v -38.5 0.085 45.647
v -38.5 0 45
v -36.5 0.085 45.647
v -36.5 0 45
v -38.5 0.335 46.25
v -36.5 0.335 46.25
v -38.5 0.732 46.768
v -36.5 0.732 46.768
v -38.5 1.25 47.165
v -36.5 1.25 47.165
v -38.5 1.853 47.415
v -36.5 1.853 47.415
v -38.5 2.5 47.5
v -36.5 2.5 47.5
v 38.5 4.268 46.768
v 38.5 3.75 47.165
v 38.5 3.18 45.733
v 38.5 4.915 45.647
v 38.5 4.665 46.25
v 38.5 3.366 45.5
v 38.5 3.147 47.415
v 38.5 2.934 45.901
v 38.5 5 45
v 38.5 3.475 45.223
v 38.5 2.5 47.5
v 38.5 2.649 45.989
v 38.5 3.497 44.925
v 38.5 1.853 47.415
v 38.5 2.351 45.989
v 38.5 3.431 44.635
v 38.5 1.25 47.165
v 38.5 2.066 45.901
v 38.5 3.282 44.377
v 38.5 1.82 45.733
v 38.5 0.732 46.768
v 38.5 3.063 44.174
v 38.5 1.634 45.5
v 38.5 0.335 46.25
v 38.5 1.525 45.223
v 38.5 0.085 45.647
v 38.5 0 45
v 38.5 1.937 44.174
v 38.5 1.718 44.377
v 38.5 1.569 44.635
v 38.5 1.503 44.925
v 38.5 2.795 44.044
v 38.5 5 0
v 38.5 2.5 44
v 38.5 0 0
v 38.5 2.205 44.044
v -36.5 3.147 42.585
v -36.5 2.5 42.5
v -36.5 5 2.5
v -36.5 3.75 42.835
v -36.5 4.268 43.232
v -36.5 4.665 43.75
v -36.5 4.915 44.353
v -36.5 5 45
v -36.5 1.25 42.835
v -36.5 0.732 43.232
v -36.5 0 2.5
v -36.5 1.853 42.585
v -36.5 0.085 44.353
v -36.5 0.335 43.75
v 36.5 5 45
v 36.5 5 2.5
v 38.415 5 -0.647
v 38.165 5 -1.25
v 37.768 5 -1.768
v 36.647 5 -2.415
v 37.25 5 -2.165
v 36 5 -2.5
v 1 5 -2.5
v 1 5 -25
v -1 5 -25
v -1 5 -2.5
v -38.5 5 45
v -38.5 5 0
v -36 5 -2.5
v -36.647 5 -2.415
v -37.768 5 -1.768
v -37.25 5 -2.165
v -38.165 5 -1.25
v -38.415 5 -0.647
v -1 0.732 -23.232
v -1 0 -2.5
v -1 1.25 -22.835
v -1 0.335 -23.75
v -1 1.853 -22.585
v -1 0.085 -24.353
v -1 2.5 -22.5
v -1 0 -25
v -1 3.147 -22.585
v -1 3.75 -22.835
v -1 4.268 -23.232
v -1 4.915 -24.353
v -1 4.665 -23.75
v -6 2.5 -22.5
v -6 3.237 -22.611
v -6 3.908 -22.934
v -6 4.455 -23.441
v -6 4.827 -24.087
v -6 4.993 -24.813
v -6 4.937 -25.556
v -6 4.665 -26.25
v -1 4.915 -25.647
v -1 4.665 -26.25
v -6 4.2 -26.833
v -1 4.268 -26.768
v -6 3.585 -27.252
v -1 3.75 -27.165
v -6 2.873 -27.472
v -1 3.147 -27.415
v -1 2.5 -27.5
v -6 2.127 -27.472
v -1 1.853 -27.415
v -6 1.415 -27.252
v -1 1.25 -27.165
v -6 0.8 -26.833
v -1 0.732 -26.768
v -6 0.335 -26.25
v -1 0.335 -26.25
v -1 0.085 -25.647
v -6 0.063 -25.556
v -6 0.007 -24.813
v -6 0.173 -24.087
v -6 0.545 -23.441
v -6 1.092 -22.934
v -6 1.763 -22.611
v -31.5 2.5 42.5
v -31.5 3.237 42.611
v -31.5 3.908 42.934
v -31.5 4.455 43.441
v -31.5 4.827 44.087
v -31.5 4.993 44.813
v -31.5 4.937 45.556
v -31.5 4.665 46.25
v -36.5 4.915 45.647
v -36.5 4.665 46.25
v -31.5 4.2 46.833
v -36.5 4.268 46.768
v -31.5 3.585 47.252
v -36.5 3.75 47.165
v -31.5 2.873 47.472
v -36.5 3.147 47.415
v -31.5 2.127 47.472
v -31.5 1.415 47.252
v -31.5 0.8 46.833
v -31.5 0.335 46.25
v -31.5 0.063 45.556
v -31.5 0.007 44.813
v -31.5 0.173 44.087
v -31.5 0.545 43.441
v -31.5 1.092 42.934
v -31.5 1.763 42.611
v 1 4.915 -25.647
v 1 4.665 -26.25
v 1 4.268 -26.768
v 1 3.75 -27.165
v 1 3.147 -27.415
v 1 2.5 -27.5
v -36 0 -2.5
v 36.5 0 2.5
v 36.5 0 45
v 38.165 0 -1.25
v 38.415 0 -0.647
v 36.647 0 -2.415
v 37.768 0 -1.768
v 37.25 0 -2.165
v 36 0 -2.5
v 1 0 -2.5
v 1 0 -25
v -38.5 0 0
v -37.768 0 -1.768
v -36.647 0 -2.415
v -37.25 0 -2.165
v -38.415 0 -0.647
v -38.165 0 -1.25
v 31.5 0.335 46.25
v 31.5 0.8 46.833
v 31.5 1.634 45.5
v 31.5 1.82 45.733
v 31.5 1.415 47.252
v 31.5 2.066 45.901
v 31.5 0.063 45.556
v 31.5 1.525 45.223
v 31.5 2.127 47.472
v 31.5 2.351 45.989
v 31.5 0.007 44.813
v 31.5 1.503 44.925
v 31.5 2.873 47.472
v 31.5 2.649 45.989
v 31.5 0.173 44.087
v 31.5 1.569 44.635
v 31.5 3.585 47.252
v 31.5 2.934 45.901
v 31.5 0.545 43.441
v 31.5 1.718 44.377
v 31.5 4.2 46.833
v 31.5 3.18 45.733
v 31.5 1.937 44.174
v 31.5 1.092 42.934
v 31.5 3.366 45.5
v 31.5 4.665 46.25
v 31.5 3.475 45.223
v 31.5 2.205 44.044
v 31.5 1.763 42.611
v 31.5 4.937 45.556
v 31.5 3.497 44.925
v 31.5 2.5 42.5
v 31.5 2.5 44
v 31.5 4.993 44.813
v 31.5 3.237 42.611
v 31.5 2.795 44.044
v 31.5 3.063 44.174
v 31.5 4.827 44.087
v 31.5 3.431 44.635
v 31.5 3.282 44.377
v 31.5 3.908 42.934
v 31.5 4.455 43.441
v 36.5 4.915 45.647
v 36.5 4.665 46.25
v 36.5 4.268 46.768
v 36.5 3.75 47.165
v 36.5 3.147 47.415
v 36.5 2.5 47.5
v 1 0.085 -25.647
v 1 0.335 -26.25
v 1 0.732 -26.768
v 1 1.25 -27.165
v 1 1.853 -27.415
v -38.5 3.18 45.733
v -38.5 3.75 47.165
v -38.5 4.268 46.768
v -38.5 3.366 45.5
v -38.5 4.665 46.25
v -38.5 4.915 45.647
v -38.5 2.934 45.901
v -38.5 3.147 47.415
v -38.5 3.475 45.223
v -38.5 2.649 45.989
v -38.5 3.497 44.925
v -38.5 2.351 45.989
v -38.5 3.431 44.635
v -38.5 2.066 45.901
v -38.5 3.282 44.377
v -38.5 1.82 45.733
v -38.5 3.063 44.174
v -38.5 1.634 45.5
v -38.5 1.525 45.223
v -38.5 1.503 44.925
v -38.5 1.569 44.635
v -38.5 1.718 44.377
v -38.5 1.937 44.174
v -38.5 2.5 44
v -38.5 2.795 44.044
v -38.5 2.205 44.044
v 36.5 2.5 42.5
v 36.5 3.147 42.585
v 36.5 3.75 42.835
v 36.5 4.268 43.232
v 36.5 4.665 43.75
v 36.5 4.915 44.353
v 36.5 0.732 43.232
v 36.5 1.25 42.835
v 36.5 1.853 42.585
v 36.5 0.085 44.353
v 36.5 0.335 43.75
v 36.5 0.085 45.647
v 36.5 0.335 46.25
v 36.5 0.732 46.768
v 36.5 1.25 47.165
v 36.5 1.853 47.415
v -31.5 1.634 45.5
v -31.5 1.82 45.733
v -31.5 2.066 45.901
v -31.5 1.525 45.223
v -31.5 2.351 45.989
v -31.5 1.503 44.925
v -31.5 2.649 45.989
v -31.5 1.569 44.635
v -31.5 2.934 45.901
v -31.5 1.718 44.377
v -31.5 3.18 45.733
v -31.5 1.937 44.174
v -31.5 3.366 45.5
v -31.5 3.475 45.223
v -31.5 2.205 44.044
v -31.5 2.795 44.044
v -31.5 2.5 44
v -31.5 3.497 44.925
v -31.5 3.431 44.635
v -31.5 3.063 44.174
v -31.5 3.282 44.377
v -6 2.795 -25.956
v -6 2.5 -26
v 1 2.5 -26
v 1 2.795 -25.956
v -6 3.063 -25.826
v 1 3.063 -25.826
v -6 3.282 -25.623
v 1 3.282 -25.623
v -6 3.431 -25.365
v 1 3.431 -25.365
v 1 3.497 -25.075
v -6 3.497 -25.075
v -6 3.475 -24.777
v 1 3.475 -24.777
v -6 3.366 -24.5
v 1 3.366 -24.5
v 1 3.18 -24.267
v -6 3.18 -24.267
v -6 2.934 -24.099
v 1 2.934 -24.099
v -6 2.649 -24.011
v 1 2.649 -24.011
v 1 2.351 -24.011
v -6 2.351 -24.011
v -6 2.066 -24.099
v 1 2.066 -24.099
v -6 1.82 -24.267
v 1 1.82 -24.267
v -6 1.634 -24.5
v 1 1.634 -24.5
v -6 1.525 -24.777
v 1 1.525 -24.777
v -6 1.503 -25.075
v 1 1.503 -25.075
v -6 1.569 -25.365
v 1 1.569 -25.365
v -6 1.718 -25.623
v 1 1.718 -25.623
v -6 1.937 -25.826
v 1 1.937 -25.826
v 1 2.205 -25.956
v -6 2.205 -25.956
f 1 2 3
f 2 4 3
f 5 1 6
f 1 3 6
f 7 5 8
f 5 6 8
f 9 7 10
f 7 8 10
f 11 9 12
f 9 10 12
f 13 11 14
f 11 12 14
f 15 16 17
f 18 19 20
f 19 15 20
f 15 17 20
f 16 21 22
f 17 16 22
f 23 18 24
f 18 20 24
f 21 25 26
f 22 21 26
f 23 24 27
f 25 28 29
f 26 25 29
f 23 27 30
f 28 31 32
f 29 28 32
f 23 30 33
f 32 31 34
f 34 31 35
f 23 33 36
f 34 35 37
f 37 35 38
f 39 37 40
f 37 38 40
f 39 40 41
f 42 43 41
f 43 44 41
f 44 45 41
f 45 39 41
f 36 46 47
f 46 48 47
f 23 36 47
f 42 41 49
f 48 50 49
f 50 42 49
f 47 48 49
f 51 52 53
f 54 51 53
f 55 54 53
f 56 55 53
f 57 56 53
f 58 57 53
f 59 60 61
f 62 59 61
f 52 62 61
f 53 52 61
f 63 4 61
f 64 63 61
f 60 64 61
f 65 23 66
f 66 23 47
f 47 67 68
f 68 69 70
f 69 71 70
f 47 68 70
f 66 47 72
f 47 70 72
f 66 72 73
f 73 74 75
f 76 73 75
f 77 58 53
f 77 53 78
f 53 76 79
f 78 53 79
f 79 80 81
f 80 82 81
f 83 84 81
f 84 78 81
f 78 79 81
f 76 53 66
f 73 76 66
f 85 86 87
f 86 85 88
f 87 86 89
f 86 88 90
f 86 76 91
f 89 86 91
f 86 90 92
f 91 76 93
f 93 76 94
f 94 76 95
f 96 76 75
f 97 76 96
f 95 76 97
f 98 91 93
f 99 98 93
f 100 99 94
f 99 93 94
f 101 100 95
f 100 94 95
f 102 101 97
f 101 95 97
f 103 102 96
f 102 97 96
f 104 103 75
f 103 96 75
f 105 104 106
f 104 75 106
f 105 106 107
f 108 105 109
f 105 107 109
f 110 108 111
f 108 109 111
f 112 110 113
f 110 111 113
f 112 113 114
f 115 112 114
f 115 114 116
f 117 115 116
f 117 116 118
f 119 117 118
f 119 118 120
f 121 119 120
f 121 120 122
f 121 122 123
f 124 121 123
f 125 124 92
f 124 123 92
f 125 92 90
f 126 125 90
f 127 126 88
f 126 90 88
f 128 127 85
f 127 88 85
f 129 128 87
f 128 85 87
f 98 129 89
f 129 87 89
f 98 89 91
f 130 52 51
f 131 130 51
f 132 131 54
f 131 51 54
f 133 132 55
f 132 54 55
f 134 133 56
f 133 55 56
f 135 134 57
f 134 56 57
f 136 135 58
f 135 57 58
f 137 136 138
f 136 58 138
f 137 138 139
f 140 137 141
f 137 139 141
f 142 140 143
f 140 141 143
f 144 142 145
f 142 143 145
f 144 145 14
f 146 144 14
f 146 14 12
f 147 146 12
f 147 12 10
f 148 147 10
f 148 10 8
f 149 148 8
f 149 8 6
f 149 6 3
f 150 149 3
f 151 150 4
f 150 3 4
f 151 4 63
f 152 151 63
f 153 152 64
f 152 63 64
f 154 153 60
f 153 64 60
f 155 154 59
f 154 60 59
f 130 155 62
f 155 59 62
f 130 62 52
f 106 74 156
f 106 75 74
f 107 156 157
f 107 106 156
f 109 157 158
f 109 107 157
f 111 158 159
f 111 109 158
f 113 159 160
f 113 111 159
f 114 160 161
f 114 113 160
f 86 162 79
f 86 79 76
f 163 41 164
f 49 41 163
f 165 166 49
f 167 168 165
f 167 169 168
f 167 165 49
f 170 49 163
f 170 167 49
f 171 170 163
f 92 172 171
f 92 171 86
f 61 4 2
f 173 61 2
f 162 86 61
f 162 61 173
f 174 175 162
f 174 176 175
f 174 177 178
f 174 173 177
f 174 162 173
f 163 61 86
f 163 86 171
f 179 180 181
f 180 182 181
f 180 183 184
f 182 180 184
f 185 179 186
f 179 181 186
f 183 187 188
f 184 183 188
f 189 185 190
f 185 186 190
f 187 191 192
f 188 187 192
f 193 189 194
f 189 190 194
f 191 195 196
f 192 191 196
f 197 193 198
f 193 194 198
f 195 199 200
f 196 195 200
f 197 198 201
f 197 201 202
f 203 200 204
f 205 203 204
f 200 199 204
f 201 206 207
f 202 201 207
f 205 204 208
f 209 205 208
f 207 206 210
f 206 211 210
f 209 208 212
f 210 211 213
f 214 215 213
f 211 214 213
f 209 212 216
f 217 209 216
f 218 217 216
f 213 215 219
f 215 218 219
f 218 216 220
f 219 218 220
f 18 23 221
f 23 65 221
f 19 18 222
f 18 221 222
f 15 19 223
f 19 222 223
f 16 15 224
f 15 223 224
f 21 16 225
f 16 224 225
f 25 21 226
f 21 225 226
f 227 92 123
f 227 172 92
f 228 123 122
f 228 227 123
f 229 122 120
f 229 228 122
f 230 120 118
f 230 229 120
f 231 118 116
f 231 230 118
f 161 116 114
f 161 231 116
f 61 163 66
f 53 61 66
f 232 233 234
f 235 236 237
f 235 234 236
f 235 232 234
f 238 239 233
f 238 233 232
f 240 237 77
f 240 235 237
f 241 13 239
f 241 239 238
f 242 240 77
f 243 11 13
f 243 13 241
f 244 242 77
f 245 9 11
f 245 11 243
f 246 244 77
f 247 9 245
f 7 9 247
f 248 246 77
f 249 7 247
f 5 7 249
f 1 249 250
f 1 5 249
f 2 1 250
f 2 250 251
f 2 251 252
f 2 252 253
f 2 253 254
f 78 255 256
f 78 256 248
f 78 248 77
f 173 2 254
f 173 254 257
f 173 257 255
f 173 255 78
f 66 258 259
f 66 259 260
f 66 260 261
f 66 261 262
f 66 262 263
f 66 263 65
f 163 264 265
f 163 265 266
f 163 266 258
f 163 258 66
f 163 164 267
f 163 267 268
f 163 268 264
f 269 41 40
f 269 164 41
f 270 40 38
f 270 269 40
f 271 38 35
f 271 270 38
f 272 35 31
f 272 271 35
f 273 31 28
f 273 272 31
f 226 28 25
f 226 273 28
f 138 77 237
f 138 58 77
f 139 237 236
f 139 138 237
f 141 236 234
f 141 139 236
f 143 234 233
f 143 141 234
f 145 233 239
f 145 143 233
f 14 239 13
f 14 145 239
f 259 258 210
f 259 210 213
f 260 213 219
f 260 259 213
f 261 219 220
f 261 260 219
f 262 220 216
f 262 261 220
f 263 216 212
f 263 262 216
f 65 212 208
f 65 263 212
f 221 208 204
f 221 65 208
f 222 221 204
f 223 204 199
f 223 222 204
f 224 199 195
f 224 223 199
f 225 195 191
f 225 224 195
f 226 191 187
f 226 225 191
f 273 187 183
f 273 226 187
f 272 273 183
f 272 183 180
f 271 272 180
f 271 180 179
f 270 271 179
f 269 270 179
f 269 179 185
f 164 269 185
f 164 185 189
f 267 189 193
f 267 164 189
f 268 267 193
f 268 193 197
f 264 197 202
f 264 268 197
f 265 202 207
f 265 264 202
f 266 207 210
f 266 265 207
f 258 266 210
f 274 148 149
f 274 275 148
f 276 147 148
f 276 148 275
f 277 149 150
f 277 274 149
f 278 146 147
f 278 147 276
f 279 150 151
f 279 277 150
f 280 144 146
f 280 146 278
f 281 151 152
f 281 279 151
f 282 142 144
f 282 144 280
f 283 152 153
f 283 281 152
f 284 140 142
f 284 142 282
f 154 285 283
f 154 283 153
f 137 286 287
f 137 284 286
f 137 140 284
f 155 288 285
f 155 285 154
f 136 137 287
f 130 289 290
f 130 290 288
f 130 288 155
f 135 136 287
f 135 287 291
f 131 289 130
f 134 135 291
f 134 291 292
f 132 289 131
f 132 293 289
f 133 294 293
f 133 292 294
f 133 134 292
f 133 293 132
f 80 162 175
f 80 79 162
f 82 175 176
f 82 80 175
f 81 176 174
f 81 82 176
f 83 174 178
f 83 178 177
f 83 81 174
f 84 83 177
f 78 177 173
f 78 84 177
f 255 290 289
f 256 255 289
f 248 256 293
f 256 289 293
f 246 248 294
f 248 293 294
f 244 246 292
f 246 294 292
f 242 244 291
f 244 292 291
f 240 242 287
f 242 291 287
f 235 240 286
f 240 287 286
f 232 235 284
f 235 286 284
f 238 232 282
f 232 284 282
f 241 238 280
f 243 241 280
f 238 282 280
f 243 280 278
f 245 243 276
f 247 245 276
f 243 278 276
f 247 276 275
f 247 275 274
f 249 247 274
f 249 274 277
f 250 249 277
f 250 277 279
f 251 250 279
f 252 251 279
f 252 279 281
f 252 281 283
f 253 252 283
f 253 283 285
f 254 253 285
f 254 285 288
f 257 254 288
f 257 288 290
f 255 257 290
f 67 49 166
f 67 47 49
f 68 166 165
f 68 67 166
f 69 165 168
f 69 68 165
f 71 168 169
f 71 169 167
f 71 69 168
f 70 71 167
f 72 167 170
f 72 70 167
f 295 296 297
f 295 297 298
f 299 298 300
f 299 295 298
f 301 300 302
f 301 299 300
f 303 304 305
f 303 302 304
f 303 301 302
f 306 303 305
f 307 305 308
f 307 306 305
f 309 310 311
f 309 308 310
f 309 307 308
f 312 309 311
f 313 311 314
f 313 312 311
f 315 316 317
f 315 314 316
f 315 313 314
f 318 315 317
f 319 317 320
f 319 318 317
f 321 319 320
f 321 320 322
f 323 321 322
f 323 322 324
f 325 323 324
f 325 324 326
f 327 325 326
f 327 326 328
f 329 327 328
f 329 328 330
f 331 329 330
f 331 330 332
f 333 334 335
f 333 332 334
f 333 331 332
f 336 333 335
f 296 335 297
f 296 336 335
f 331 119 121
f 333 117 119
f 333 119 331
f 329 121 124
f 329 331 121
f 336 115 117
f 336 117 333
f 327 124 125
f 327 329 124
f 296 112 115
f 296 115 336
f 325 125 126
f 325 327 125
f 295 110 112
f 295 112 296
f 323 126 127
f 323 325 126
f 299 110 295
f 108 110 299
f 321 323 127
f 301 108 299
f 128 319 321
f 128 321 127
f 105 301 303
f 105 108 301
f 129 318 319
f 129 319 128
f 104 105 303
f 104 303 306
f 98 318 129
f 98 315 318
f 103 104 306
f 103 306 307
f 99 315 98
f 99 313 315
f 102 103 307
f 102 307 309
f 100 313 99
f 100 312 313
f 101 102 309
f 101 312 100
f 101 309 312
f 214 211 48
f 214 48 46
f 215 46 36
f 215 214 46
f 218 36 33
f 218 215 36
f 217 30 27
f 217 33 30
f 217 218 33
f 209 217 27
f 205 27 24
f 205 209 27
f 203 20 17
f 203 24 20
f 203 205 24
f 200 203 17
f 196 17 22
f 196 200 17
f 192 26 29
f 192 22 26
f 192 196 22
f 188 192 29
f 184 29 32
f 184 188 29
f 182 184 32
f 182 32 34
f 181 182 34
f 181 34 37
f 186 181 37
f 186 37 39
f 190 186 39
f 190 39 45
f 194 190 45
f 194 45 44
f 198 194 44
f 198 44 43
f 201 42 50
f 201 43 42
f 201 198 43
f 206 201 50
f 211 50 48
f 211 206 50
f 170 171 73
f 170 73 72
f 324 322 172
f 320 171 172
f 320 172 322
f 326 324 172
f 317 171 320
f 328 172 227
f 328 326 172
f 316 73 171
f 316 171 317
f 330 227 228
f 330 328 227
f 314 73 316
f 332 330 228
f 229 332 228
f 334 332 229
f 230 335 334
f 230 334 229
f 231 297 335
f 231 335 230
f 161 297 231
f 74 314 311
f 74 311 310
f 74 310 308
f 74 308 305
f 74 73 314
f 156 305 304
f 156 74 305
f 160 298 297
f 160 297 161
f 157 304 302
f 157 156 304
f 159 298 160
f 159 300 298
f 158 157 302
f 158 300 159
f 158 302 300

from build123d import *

# Parameters (mm, degrees)
ESBO_O1_W                  = 77
ESBO_O1_H                  = 5
RESSALTO_EXTRUS_O1_DEPTH   = 5
ESBO_O2_W                  = 2
ESBO_O2_H                  = 50
RESSALTO_EXTRUS_O2_DEPTH   = 5
FILETE1_R                  = 2.5
ESBO_O7_R                  = 2.5
RESSALTO_EXTRUS_O5_DEPTH   = 5
ESBO_O3_R                  = 1
CORTE_EXTRUS_O1_DEPTH      = 62.347371582
FILETE1_OF_ESPELHAR1_R     = 2.5
FILETE2_R                  = 2.5
ESBO_O4_W                  = 30
ESBO_O4_H                  = 5
RESSALTO_EXTRUS_O3_DEPTH   = 1
FILETE3_R                  = 2.5
ESBO_O6_R                  = 2.5
RESSALTO_EXTRUS_O4_DEPTH   = 5
CORTE_EXTRUS_O2_DEPTH      = 62.347371582
CORTE_EXTRUS_O2_DEPTH_BACK = 62.347371582
ESBO_O5_R                  = 1


with BuildPart() as part:
    # Esboço1 → Ressalto-extrusão1 (new body)
    with BuildSketch(Plane(origin=(0, 0, 0), x_dir=(1, 0, 0), z_dir=(0, 1, 0))):
        Rectangle(ESBO_O1_W, ESBO_O1_H)
    extrude(amount=RESSALTO_EXTRUS_O1_DEPTH)

    # Esboço2 → Ressalto-extrusão2 (add)
    with BuildSketch(Plane(origin=(0, 0, 0), x_dir=(1, 0, 0), z_dir=(0, 1, 0))):
        with Locations((-37.5, -22.5)):
            Rectangle(ESBO_O2_W, ESBO_O2_H)
    ressalto_extrus_o2 = extrude(amount=RESSALTO_EXTRUS_O2_DEPTH)

    # Filete1
    filete1_edges = [part.edges().sort_by_distance(p)[0] for p in [
        (-37.5, 0, 47.5),
        (-37.5, 5, 47.5),
    ]]
    fillet(filete1_edges, radius=FILETE1_R - 0.0001)  # a hair under: the kernel refuses the full size

    # Esboço7 → Ressalto-extrusão5 (add)
    with BuildSketch(Plane(origin=(-36.5, 0, 0), x_dir=(0, 0, -1), z_dir=(1, 0, 0))):
        with Locations((-45, 2.5)):
            Circle(ESBO_O7_R)
    ressalto_extrus_o5 = extrude(amount=RESSALTO_EXTRUS_O5_DEPTH)

    # Esboço3 → Corte-extrusão1 (cut, through all)
    with BuildSketch(Plane(origin=(0, 0, 0), x_dir=(0, 0, -1), z_dir=(1, 0, 0))):
        with Locations((-45, 2.5)):
            Circle(ESBO_O3_R)
    corte_extrus_o1 = extrude(amount=-CORTE_EXTRUS_O1_DEPTH, mode=Mode.SUBTRACT)

    # Espelhar1: Ressalto-extrusão2, Ressalto-extrusão5, Corte-extrusão1 across plane
    add(ressalto_extrus_o2.mirror(Plane(origin=(0, 0, 0), x_dir=(0, 0, 1), z_dir=(1, 0, 0))))
    add(ressalto_extrus_o5.mirror(Plane(origin=(0, 0, 0), x_dir=(0, 0, 1), z_dir=(1, 0, 0))))
    add(corte_extrus_o1.mirror(Plane(origin=(0, 0, 0), x_dir=(0, 0, 1), z_dir=(1, 0, 0))), mode=Mode.SUBTRACT)

    # Filete1 of Espelhar1
    filete1_of_espelhar1_edges = [part.edges().sort_by_distance(p)[0] for p in [
        (37.5, 0, 47.5),
        (37.5, 5, 47.5),
    ]]
    fillet(filete1_of_espelhar1_edges, radius=FILETE1_OF_ESPELHAR1_R - 0.0001)  # a hair under: the kernel refuses the full size

    # Filete2
    filete2_edges = [part.edges().sort_by_distance(p)[0] for p in [
        (-38.5, 2.5, -2.5),
        (38.5, 2.5, -2.5),
    ]]
    fillet(filete2_edges, radius=FILETE2_R)

    # Esboço4 → Ressalto-extrusão3 (add, symmetric)
    with BuildSketch(Plane(origin=(0, 0, 0), x_dir=(0, 0, -1), z_dir=(1, 0, 0))):
        with Locations((12.5, 2.5)):
            Rectangle(ESBO_O4_W, ESBO_O4_H)
    extrude(amount=RESSALTO_EXTRUS_O3_DEPTH, both=True)

    # Filete3
    filete3_edges = [part.edges().sort_by_distance(p)[0] for p in [
        (0, 5, -27.5),
        (0, 0, -27.5),
    ]]
    fillet(filete3_edges, radius=FILETE3_R - 0.0001)  # a hair under: the kernel refuses the full size

    # Esboço6 → Ressalto-extrusão4 (add)
    with BuildSketch(Plane.ZY.offset(1)):
        with Locations((-25, 2.5)):
            Circle(ESBO_O6_R)
    extrude(amount=RESSALTO_EXTRUS_O4_DEPTH)

    # Esboço5 → Corte-extrusão2 (cut, two sides: drawn at the far end of the back side and taken through both)
    with BuildSketch(Plane(origin=(0, 0, 0), x_dir=(0, 0, -1), z_dir=(1, 0, 0)).offset(-CORTE_EXTRUS_O2_DEPTH_BACK)):
        with Locations((25, 2.5)):
            Circle(ESBO_O5_R)
    extrude(amount=CORTE_EXTRUS_O2_DEPTH + CORTE_EXTRUS_O2_DEPTH_BACK, mode=Mode.SUBTRACT)


solid = part.part
